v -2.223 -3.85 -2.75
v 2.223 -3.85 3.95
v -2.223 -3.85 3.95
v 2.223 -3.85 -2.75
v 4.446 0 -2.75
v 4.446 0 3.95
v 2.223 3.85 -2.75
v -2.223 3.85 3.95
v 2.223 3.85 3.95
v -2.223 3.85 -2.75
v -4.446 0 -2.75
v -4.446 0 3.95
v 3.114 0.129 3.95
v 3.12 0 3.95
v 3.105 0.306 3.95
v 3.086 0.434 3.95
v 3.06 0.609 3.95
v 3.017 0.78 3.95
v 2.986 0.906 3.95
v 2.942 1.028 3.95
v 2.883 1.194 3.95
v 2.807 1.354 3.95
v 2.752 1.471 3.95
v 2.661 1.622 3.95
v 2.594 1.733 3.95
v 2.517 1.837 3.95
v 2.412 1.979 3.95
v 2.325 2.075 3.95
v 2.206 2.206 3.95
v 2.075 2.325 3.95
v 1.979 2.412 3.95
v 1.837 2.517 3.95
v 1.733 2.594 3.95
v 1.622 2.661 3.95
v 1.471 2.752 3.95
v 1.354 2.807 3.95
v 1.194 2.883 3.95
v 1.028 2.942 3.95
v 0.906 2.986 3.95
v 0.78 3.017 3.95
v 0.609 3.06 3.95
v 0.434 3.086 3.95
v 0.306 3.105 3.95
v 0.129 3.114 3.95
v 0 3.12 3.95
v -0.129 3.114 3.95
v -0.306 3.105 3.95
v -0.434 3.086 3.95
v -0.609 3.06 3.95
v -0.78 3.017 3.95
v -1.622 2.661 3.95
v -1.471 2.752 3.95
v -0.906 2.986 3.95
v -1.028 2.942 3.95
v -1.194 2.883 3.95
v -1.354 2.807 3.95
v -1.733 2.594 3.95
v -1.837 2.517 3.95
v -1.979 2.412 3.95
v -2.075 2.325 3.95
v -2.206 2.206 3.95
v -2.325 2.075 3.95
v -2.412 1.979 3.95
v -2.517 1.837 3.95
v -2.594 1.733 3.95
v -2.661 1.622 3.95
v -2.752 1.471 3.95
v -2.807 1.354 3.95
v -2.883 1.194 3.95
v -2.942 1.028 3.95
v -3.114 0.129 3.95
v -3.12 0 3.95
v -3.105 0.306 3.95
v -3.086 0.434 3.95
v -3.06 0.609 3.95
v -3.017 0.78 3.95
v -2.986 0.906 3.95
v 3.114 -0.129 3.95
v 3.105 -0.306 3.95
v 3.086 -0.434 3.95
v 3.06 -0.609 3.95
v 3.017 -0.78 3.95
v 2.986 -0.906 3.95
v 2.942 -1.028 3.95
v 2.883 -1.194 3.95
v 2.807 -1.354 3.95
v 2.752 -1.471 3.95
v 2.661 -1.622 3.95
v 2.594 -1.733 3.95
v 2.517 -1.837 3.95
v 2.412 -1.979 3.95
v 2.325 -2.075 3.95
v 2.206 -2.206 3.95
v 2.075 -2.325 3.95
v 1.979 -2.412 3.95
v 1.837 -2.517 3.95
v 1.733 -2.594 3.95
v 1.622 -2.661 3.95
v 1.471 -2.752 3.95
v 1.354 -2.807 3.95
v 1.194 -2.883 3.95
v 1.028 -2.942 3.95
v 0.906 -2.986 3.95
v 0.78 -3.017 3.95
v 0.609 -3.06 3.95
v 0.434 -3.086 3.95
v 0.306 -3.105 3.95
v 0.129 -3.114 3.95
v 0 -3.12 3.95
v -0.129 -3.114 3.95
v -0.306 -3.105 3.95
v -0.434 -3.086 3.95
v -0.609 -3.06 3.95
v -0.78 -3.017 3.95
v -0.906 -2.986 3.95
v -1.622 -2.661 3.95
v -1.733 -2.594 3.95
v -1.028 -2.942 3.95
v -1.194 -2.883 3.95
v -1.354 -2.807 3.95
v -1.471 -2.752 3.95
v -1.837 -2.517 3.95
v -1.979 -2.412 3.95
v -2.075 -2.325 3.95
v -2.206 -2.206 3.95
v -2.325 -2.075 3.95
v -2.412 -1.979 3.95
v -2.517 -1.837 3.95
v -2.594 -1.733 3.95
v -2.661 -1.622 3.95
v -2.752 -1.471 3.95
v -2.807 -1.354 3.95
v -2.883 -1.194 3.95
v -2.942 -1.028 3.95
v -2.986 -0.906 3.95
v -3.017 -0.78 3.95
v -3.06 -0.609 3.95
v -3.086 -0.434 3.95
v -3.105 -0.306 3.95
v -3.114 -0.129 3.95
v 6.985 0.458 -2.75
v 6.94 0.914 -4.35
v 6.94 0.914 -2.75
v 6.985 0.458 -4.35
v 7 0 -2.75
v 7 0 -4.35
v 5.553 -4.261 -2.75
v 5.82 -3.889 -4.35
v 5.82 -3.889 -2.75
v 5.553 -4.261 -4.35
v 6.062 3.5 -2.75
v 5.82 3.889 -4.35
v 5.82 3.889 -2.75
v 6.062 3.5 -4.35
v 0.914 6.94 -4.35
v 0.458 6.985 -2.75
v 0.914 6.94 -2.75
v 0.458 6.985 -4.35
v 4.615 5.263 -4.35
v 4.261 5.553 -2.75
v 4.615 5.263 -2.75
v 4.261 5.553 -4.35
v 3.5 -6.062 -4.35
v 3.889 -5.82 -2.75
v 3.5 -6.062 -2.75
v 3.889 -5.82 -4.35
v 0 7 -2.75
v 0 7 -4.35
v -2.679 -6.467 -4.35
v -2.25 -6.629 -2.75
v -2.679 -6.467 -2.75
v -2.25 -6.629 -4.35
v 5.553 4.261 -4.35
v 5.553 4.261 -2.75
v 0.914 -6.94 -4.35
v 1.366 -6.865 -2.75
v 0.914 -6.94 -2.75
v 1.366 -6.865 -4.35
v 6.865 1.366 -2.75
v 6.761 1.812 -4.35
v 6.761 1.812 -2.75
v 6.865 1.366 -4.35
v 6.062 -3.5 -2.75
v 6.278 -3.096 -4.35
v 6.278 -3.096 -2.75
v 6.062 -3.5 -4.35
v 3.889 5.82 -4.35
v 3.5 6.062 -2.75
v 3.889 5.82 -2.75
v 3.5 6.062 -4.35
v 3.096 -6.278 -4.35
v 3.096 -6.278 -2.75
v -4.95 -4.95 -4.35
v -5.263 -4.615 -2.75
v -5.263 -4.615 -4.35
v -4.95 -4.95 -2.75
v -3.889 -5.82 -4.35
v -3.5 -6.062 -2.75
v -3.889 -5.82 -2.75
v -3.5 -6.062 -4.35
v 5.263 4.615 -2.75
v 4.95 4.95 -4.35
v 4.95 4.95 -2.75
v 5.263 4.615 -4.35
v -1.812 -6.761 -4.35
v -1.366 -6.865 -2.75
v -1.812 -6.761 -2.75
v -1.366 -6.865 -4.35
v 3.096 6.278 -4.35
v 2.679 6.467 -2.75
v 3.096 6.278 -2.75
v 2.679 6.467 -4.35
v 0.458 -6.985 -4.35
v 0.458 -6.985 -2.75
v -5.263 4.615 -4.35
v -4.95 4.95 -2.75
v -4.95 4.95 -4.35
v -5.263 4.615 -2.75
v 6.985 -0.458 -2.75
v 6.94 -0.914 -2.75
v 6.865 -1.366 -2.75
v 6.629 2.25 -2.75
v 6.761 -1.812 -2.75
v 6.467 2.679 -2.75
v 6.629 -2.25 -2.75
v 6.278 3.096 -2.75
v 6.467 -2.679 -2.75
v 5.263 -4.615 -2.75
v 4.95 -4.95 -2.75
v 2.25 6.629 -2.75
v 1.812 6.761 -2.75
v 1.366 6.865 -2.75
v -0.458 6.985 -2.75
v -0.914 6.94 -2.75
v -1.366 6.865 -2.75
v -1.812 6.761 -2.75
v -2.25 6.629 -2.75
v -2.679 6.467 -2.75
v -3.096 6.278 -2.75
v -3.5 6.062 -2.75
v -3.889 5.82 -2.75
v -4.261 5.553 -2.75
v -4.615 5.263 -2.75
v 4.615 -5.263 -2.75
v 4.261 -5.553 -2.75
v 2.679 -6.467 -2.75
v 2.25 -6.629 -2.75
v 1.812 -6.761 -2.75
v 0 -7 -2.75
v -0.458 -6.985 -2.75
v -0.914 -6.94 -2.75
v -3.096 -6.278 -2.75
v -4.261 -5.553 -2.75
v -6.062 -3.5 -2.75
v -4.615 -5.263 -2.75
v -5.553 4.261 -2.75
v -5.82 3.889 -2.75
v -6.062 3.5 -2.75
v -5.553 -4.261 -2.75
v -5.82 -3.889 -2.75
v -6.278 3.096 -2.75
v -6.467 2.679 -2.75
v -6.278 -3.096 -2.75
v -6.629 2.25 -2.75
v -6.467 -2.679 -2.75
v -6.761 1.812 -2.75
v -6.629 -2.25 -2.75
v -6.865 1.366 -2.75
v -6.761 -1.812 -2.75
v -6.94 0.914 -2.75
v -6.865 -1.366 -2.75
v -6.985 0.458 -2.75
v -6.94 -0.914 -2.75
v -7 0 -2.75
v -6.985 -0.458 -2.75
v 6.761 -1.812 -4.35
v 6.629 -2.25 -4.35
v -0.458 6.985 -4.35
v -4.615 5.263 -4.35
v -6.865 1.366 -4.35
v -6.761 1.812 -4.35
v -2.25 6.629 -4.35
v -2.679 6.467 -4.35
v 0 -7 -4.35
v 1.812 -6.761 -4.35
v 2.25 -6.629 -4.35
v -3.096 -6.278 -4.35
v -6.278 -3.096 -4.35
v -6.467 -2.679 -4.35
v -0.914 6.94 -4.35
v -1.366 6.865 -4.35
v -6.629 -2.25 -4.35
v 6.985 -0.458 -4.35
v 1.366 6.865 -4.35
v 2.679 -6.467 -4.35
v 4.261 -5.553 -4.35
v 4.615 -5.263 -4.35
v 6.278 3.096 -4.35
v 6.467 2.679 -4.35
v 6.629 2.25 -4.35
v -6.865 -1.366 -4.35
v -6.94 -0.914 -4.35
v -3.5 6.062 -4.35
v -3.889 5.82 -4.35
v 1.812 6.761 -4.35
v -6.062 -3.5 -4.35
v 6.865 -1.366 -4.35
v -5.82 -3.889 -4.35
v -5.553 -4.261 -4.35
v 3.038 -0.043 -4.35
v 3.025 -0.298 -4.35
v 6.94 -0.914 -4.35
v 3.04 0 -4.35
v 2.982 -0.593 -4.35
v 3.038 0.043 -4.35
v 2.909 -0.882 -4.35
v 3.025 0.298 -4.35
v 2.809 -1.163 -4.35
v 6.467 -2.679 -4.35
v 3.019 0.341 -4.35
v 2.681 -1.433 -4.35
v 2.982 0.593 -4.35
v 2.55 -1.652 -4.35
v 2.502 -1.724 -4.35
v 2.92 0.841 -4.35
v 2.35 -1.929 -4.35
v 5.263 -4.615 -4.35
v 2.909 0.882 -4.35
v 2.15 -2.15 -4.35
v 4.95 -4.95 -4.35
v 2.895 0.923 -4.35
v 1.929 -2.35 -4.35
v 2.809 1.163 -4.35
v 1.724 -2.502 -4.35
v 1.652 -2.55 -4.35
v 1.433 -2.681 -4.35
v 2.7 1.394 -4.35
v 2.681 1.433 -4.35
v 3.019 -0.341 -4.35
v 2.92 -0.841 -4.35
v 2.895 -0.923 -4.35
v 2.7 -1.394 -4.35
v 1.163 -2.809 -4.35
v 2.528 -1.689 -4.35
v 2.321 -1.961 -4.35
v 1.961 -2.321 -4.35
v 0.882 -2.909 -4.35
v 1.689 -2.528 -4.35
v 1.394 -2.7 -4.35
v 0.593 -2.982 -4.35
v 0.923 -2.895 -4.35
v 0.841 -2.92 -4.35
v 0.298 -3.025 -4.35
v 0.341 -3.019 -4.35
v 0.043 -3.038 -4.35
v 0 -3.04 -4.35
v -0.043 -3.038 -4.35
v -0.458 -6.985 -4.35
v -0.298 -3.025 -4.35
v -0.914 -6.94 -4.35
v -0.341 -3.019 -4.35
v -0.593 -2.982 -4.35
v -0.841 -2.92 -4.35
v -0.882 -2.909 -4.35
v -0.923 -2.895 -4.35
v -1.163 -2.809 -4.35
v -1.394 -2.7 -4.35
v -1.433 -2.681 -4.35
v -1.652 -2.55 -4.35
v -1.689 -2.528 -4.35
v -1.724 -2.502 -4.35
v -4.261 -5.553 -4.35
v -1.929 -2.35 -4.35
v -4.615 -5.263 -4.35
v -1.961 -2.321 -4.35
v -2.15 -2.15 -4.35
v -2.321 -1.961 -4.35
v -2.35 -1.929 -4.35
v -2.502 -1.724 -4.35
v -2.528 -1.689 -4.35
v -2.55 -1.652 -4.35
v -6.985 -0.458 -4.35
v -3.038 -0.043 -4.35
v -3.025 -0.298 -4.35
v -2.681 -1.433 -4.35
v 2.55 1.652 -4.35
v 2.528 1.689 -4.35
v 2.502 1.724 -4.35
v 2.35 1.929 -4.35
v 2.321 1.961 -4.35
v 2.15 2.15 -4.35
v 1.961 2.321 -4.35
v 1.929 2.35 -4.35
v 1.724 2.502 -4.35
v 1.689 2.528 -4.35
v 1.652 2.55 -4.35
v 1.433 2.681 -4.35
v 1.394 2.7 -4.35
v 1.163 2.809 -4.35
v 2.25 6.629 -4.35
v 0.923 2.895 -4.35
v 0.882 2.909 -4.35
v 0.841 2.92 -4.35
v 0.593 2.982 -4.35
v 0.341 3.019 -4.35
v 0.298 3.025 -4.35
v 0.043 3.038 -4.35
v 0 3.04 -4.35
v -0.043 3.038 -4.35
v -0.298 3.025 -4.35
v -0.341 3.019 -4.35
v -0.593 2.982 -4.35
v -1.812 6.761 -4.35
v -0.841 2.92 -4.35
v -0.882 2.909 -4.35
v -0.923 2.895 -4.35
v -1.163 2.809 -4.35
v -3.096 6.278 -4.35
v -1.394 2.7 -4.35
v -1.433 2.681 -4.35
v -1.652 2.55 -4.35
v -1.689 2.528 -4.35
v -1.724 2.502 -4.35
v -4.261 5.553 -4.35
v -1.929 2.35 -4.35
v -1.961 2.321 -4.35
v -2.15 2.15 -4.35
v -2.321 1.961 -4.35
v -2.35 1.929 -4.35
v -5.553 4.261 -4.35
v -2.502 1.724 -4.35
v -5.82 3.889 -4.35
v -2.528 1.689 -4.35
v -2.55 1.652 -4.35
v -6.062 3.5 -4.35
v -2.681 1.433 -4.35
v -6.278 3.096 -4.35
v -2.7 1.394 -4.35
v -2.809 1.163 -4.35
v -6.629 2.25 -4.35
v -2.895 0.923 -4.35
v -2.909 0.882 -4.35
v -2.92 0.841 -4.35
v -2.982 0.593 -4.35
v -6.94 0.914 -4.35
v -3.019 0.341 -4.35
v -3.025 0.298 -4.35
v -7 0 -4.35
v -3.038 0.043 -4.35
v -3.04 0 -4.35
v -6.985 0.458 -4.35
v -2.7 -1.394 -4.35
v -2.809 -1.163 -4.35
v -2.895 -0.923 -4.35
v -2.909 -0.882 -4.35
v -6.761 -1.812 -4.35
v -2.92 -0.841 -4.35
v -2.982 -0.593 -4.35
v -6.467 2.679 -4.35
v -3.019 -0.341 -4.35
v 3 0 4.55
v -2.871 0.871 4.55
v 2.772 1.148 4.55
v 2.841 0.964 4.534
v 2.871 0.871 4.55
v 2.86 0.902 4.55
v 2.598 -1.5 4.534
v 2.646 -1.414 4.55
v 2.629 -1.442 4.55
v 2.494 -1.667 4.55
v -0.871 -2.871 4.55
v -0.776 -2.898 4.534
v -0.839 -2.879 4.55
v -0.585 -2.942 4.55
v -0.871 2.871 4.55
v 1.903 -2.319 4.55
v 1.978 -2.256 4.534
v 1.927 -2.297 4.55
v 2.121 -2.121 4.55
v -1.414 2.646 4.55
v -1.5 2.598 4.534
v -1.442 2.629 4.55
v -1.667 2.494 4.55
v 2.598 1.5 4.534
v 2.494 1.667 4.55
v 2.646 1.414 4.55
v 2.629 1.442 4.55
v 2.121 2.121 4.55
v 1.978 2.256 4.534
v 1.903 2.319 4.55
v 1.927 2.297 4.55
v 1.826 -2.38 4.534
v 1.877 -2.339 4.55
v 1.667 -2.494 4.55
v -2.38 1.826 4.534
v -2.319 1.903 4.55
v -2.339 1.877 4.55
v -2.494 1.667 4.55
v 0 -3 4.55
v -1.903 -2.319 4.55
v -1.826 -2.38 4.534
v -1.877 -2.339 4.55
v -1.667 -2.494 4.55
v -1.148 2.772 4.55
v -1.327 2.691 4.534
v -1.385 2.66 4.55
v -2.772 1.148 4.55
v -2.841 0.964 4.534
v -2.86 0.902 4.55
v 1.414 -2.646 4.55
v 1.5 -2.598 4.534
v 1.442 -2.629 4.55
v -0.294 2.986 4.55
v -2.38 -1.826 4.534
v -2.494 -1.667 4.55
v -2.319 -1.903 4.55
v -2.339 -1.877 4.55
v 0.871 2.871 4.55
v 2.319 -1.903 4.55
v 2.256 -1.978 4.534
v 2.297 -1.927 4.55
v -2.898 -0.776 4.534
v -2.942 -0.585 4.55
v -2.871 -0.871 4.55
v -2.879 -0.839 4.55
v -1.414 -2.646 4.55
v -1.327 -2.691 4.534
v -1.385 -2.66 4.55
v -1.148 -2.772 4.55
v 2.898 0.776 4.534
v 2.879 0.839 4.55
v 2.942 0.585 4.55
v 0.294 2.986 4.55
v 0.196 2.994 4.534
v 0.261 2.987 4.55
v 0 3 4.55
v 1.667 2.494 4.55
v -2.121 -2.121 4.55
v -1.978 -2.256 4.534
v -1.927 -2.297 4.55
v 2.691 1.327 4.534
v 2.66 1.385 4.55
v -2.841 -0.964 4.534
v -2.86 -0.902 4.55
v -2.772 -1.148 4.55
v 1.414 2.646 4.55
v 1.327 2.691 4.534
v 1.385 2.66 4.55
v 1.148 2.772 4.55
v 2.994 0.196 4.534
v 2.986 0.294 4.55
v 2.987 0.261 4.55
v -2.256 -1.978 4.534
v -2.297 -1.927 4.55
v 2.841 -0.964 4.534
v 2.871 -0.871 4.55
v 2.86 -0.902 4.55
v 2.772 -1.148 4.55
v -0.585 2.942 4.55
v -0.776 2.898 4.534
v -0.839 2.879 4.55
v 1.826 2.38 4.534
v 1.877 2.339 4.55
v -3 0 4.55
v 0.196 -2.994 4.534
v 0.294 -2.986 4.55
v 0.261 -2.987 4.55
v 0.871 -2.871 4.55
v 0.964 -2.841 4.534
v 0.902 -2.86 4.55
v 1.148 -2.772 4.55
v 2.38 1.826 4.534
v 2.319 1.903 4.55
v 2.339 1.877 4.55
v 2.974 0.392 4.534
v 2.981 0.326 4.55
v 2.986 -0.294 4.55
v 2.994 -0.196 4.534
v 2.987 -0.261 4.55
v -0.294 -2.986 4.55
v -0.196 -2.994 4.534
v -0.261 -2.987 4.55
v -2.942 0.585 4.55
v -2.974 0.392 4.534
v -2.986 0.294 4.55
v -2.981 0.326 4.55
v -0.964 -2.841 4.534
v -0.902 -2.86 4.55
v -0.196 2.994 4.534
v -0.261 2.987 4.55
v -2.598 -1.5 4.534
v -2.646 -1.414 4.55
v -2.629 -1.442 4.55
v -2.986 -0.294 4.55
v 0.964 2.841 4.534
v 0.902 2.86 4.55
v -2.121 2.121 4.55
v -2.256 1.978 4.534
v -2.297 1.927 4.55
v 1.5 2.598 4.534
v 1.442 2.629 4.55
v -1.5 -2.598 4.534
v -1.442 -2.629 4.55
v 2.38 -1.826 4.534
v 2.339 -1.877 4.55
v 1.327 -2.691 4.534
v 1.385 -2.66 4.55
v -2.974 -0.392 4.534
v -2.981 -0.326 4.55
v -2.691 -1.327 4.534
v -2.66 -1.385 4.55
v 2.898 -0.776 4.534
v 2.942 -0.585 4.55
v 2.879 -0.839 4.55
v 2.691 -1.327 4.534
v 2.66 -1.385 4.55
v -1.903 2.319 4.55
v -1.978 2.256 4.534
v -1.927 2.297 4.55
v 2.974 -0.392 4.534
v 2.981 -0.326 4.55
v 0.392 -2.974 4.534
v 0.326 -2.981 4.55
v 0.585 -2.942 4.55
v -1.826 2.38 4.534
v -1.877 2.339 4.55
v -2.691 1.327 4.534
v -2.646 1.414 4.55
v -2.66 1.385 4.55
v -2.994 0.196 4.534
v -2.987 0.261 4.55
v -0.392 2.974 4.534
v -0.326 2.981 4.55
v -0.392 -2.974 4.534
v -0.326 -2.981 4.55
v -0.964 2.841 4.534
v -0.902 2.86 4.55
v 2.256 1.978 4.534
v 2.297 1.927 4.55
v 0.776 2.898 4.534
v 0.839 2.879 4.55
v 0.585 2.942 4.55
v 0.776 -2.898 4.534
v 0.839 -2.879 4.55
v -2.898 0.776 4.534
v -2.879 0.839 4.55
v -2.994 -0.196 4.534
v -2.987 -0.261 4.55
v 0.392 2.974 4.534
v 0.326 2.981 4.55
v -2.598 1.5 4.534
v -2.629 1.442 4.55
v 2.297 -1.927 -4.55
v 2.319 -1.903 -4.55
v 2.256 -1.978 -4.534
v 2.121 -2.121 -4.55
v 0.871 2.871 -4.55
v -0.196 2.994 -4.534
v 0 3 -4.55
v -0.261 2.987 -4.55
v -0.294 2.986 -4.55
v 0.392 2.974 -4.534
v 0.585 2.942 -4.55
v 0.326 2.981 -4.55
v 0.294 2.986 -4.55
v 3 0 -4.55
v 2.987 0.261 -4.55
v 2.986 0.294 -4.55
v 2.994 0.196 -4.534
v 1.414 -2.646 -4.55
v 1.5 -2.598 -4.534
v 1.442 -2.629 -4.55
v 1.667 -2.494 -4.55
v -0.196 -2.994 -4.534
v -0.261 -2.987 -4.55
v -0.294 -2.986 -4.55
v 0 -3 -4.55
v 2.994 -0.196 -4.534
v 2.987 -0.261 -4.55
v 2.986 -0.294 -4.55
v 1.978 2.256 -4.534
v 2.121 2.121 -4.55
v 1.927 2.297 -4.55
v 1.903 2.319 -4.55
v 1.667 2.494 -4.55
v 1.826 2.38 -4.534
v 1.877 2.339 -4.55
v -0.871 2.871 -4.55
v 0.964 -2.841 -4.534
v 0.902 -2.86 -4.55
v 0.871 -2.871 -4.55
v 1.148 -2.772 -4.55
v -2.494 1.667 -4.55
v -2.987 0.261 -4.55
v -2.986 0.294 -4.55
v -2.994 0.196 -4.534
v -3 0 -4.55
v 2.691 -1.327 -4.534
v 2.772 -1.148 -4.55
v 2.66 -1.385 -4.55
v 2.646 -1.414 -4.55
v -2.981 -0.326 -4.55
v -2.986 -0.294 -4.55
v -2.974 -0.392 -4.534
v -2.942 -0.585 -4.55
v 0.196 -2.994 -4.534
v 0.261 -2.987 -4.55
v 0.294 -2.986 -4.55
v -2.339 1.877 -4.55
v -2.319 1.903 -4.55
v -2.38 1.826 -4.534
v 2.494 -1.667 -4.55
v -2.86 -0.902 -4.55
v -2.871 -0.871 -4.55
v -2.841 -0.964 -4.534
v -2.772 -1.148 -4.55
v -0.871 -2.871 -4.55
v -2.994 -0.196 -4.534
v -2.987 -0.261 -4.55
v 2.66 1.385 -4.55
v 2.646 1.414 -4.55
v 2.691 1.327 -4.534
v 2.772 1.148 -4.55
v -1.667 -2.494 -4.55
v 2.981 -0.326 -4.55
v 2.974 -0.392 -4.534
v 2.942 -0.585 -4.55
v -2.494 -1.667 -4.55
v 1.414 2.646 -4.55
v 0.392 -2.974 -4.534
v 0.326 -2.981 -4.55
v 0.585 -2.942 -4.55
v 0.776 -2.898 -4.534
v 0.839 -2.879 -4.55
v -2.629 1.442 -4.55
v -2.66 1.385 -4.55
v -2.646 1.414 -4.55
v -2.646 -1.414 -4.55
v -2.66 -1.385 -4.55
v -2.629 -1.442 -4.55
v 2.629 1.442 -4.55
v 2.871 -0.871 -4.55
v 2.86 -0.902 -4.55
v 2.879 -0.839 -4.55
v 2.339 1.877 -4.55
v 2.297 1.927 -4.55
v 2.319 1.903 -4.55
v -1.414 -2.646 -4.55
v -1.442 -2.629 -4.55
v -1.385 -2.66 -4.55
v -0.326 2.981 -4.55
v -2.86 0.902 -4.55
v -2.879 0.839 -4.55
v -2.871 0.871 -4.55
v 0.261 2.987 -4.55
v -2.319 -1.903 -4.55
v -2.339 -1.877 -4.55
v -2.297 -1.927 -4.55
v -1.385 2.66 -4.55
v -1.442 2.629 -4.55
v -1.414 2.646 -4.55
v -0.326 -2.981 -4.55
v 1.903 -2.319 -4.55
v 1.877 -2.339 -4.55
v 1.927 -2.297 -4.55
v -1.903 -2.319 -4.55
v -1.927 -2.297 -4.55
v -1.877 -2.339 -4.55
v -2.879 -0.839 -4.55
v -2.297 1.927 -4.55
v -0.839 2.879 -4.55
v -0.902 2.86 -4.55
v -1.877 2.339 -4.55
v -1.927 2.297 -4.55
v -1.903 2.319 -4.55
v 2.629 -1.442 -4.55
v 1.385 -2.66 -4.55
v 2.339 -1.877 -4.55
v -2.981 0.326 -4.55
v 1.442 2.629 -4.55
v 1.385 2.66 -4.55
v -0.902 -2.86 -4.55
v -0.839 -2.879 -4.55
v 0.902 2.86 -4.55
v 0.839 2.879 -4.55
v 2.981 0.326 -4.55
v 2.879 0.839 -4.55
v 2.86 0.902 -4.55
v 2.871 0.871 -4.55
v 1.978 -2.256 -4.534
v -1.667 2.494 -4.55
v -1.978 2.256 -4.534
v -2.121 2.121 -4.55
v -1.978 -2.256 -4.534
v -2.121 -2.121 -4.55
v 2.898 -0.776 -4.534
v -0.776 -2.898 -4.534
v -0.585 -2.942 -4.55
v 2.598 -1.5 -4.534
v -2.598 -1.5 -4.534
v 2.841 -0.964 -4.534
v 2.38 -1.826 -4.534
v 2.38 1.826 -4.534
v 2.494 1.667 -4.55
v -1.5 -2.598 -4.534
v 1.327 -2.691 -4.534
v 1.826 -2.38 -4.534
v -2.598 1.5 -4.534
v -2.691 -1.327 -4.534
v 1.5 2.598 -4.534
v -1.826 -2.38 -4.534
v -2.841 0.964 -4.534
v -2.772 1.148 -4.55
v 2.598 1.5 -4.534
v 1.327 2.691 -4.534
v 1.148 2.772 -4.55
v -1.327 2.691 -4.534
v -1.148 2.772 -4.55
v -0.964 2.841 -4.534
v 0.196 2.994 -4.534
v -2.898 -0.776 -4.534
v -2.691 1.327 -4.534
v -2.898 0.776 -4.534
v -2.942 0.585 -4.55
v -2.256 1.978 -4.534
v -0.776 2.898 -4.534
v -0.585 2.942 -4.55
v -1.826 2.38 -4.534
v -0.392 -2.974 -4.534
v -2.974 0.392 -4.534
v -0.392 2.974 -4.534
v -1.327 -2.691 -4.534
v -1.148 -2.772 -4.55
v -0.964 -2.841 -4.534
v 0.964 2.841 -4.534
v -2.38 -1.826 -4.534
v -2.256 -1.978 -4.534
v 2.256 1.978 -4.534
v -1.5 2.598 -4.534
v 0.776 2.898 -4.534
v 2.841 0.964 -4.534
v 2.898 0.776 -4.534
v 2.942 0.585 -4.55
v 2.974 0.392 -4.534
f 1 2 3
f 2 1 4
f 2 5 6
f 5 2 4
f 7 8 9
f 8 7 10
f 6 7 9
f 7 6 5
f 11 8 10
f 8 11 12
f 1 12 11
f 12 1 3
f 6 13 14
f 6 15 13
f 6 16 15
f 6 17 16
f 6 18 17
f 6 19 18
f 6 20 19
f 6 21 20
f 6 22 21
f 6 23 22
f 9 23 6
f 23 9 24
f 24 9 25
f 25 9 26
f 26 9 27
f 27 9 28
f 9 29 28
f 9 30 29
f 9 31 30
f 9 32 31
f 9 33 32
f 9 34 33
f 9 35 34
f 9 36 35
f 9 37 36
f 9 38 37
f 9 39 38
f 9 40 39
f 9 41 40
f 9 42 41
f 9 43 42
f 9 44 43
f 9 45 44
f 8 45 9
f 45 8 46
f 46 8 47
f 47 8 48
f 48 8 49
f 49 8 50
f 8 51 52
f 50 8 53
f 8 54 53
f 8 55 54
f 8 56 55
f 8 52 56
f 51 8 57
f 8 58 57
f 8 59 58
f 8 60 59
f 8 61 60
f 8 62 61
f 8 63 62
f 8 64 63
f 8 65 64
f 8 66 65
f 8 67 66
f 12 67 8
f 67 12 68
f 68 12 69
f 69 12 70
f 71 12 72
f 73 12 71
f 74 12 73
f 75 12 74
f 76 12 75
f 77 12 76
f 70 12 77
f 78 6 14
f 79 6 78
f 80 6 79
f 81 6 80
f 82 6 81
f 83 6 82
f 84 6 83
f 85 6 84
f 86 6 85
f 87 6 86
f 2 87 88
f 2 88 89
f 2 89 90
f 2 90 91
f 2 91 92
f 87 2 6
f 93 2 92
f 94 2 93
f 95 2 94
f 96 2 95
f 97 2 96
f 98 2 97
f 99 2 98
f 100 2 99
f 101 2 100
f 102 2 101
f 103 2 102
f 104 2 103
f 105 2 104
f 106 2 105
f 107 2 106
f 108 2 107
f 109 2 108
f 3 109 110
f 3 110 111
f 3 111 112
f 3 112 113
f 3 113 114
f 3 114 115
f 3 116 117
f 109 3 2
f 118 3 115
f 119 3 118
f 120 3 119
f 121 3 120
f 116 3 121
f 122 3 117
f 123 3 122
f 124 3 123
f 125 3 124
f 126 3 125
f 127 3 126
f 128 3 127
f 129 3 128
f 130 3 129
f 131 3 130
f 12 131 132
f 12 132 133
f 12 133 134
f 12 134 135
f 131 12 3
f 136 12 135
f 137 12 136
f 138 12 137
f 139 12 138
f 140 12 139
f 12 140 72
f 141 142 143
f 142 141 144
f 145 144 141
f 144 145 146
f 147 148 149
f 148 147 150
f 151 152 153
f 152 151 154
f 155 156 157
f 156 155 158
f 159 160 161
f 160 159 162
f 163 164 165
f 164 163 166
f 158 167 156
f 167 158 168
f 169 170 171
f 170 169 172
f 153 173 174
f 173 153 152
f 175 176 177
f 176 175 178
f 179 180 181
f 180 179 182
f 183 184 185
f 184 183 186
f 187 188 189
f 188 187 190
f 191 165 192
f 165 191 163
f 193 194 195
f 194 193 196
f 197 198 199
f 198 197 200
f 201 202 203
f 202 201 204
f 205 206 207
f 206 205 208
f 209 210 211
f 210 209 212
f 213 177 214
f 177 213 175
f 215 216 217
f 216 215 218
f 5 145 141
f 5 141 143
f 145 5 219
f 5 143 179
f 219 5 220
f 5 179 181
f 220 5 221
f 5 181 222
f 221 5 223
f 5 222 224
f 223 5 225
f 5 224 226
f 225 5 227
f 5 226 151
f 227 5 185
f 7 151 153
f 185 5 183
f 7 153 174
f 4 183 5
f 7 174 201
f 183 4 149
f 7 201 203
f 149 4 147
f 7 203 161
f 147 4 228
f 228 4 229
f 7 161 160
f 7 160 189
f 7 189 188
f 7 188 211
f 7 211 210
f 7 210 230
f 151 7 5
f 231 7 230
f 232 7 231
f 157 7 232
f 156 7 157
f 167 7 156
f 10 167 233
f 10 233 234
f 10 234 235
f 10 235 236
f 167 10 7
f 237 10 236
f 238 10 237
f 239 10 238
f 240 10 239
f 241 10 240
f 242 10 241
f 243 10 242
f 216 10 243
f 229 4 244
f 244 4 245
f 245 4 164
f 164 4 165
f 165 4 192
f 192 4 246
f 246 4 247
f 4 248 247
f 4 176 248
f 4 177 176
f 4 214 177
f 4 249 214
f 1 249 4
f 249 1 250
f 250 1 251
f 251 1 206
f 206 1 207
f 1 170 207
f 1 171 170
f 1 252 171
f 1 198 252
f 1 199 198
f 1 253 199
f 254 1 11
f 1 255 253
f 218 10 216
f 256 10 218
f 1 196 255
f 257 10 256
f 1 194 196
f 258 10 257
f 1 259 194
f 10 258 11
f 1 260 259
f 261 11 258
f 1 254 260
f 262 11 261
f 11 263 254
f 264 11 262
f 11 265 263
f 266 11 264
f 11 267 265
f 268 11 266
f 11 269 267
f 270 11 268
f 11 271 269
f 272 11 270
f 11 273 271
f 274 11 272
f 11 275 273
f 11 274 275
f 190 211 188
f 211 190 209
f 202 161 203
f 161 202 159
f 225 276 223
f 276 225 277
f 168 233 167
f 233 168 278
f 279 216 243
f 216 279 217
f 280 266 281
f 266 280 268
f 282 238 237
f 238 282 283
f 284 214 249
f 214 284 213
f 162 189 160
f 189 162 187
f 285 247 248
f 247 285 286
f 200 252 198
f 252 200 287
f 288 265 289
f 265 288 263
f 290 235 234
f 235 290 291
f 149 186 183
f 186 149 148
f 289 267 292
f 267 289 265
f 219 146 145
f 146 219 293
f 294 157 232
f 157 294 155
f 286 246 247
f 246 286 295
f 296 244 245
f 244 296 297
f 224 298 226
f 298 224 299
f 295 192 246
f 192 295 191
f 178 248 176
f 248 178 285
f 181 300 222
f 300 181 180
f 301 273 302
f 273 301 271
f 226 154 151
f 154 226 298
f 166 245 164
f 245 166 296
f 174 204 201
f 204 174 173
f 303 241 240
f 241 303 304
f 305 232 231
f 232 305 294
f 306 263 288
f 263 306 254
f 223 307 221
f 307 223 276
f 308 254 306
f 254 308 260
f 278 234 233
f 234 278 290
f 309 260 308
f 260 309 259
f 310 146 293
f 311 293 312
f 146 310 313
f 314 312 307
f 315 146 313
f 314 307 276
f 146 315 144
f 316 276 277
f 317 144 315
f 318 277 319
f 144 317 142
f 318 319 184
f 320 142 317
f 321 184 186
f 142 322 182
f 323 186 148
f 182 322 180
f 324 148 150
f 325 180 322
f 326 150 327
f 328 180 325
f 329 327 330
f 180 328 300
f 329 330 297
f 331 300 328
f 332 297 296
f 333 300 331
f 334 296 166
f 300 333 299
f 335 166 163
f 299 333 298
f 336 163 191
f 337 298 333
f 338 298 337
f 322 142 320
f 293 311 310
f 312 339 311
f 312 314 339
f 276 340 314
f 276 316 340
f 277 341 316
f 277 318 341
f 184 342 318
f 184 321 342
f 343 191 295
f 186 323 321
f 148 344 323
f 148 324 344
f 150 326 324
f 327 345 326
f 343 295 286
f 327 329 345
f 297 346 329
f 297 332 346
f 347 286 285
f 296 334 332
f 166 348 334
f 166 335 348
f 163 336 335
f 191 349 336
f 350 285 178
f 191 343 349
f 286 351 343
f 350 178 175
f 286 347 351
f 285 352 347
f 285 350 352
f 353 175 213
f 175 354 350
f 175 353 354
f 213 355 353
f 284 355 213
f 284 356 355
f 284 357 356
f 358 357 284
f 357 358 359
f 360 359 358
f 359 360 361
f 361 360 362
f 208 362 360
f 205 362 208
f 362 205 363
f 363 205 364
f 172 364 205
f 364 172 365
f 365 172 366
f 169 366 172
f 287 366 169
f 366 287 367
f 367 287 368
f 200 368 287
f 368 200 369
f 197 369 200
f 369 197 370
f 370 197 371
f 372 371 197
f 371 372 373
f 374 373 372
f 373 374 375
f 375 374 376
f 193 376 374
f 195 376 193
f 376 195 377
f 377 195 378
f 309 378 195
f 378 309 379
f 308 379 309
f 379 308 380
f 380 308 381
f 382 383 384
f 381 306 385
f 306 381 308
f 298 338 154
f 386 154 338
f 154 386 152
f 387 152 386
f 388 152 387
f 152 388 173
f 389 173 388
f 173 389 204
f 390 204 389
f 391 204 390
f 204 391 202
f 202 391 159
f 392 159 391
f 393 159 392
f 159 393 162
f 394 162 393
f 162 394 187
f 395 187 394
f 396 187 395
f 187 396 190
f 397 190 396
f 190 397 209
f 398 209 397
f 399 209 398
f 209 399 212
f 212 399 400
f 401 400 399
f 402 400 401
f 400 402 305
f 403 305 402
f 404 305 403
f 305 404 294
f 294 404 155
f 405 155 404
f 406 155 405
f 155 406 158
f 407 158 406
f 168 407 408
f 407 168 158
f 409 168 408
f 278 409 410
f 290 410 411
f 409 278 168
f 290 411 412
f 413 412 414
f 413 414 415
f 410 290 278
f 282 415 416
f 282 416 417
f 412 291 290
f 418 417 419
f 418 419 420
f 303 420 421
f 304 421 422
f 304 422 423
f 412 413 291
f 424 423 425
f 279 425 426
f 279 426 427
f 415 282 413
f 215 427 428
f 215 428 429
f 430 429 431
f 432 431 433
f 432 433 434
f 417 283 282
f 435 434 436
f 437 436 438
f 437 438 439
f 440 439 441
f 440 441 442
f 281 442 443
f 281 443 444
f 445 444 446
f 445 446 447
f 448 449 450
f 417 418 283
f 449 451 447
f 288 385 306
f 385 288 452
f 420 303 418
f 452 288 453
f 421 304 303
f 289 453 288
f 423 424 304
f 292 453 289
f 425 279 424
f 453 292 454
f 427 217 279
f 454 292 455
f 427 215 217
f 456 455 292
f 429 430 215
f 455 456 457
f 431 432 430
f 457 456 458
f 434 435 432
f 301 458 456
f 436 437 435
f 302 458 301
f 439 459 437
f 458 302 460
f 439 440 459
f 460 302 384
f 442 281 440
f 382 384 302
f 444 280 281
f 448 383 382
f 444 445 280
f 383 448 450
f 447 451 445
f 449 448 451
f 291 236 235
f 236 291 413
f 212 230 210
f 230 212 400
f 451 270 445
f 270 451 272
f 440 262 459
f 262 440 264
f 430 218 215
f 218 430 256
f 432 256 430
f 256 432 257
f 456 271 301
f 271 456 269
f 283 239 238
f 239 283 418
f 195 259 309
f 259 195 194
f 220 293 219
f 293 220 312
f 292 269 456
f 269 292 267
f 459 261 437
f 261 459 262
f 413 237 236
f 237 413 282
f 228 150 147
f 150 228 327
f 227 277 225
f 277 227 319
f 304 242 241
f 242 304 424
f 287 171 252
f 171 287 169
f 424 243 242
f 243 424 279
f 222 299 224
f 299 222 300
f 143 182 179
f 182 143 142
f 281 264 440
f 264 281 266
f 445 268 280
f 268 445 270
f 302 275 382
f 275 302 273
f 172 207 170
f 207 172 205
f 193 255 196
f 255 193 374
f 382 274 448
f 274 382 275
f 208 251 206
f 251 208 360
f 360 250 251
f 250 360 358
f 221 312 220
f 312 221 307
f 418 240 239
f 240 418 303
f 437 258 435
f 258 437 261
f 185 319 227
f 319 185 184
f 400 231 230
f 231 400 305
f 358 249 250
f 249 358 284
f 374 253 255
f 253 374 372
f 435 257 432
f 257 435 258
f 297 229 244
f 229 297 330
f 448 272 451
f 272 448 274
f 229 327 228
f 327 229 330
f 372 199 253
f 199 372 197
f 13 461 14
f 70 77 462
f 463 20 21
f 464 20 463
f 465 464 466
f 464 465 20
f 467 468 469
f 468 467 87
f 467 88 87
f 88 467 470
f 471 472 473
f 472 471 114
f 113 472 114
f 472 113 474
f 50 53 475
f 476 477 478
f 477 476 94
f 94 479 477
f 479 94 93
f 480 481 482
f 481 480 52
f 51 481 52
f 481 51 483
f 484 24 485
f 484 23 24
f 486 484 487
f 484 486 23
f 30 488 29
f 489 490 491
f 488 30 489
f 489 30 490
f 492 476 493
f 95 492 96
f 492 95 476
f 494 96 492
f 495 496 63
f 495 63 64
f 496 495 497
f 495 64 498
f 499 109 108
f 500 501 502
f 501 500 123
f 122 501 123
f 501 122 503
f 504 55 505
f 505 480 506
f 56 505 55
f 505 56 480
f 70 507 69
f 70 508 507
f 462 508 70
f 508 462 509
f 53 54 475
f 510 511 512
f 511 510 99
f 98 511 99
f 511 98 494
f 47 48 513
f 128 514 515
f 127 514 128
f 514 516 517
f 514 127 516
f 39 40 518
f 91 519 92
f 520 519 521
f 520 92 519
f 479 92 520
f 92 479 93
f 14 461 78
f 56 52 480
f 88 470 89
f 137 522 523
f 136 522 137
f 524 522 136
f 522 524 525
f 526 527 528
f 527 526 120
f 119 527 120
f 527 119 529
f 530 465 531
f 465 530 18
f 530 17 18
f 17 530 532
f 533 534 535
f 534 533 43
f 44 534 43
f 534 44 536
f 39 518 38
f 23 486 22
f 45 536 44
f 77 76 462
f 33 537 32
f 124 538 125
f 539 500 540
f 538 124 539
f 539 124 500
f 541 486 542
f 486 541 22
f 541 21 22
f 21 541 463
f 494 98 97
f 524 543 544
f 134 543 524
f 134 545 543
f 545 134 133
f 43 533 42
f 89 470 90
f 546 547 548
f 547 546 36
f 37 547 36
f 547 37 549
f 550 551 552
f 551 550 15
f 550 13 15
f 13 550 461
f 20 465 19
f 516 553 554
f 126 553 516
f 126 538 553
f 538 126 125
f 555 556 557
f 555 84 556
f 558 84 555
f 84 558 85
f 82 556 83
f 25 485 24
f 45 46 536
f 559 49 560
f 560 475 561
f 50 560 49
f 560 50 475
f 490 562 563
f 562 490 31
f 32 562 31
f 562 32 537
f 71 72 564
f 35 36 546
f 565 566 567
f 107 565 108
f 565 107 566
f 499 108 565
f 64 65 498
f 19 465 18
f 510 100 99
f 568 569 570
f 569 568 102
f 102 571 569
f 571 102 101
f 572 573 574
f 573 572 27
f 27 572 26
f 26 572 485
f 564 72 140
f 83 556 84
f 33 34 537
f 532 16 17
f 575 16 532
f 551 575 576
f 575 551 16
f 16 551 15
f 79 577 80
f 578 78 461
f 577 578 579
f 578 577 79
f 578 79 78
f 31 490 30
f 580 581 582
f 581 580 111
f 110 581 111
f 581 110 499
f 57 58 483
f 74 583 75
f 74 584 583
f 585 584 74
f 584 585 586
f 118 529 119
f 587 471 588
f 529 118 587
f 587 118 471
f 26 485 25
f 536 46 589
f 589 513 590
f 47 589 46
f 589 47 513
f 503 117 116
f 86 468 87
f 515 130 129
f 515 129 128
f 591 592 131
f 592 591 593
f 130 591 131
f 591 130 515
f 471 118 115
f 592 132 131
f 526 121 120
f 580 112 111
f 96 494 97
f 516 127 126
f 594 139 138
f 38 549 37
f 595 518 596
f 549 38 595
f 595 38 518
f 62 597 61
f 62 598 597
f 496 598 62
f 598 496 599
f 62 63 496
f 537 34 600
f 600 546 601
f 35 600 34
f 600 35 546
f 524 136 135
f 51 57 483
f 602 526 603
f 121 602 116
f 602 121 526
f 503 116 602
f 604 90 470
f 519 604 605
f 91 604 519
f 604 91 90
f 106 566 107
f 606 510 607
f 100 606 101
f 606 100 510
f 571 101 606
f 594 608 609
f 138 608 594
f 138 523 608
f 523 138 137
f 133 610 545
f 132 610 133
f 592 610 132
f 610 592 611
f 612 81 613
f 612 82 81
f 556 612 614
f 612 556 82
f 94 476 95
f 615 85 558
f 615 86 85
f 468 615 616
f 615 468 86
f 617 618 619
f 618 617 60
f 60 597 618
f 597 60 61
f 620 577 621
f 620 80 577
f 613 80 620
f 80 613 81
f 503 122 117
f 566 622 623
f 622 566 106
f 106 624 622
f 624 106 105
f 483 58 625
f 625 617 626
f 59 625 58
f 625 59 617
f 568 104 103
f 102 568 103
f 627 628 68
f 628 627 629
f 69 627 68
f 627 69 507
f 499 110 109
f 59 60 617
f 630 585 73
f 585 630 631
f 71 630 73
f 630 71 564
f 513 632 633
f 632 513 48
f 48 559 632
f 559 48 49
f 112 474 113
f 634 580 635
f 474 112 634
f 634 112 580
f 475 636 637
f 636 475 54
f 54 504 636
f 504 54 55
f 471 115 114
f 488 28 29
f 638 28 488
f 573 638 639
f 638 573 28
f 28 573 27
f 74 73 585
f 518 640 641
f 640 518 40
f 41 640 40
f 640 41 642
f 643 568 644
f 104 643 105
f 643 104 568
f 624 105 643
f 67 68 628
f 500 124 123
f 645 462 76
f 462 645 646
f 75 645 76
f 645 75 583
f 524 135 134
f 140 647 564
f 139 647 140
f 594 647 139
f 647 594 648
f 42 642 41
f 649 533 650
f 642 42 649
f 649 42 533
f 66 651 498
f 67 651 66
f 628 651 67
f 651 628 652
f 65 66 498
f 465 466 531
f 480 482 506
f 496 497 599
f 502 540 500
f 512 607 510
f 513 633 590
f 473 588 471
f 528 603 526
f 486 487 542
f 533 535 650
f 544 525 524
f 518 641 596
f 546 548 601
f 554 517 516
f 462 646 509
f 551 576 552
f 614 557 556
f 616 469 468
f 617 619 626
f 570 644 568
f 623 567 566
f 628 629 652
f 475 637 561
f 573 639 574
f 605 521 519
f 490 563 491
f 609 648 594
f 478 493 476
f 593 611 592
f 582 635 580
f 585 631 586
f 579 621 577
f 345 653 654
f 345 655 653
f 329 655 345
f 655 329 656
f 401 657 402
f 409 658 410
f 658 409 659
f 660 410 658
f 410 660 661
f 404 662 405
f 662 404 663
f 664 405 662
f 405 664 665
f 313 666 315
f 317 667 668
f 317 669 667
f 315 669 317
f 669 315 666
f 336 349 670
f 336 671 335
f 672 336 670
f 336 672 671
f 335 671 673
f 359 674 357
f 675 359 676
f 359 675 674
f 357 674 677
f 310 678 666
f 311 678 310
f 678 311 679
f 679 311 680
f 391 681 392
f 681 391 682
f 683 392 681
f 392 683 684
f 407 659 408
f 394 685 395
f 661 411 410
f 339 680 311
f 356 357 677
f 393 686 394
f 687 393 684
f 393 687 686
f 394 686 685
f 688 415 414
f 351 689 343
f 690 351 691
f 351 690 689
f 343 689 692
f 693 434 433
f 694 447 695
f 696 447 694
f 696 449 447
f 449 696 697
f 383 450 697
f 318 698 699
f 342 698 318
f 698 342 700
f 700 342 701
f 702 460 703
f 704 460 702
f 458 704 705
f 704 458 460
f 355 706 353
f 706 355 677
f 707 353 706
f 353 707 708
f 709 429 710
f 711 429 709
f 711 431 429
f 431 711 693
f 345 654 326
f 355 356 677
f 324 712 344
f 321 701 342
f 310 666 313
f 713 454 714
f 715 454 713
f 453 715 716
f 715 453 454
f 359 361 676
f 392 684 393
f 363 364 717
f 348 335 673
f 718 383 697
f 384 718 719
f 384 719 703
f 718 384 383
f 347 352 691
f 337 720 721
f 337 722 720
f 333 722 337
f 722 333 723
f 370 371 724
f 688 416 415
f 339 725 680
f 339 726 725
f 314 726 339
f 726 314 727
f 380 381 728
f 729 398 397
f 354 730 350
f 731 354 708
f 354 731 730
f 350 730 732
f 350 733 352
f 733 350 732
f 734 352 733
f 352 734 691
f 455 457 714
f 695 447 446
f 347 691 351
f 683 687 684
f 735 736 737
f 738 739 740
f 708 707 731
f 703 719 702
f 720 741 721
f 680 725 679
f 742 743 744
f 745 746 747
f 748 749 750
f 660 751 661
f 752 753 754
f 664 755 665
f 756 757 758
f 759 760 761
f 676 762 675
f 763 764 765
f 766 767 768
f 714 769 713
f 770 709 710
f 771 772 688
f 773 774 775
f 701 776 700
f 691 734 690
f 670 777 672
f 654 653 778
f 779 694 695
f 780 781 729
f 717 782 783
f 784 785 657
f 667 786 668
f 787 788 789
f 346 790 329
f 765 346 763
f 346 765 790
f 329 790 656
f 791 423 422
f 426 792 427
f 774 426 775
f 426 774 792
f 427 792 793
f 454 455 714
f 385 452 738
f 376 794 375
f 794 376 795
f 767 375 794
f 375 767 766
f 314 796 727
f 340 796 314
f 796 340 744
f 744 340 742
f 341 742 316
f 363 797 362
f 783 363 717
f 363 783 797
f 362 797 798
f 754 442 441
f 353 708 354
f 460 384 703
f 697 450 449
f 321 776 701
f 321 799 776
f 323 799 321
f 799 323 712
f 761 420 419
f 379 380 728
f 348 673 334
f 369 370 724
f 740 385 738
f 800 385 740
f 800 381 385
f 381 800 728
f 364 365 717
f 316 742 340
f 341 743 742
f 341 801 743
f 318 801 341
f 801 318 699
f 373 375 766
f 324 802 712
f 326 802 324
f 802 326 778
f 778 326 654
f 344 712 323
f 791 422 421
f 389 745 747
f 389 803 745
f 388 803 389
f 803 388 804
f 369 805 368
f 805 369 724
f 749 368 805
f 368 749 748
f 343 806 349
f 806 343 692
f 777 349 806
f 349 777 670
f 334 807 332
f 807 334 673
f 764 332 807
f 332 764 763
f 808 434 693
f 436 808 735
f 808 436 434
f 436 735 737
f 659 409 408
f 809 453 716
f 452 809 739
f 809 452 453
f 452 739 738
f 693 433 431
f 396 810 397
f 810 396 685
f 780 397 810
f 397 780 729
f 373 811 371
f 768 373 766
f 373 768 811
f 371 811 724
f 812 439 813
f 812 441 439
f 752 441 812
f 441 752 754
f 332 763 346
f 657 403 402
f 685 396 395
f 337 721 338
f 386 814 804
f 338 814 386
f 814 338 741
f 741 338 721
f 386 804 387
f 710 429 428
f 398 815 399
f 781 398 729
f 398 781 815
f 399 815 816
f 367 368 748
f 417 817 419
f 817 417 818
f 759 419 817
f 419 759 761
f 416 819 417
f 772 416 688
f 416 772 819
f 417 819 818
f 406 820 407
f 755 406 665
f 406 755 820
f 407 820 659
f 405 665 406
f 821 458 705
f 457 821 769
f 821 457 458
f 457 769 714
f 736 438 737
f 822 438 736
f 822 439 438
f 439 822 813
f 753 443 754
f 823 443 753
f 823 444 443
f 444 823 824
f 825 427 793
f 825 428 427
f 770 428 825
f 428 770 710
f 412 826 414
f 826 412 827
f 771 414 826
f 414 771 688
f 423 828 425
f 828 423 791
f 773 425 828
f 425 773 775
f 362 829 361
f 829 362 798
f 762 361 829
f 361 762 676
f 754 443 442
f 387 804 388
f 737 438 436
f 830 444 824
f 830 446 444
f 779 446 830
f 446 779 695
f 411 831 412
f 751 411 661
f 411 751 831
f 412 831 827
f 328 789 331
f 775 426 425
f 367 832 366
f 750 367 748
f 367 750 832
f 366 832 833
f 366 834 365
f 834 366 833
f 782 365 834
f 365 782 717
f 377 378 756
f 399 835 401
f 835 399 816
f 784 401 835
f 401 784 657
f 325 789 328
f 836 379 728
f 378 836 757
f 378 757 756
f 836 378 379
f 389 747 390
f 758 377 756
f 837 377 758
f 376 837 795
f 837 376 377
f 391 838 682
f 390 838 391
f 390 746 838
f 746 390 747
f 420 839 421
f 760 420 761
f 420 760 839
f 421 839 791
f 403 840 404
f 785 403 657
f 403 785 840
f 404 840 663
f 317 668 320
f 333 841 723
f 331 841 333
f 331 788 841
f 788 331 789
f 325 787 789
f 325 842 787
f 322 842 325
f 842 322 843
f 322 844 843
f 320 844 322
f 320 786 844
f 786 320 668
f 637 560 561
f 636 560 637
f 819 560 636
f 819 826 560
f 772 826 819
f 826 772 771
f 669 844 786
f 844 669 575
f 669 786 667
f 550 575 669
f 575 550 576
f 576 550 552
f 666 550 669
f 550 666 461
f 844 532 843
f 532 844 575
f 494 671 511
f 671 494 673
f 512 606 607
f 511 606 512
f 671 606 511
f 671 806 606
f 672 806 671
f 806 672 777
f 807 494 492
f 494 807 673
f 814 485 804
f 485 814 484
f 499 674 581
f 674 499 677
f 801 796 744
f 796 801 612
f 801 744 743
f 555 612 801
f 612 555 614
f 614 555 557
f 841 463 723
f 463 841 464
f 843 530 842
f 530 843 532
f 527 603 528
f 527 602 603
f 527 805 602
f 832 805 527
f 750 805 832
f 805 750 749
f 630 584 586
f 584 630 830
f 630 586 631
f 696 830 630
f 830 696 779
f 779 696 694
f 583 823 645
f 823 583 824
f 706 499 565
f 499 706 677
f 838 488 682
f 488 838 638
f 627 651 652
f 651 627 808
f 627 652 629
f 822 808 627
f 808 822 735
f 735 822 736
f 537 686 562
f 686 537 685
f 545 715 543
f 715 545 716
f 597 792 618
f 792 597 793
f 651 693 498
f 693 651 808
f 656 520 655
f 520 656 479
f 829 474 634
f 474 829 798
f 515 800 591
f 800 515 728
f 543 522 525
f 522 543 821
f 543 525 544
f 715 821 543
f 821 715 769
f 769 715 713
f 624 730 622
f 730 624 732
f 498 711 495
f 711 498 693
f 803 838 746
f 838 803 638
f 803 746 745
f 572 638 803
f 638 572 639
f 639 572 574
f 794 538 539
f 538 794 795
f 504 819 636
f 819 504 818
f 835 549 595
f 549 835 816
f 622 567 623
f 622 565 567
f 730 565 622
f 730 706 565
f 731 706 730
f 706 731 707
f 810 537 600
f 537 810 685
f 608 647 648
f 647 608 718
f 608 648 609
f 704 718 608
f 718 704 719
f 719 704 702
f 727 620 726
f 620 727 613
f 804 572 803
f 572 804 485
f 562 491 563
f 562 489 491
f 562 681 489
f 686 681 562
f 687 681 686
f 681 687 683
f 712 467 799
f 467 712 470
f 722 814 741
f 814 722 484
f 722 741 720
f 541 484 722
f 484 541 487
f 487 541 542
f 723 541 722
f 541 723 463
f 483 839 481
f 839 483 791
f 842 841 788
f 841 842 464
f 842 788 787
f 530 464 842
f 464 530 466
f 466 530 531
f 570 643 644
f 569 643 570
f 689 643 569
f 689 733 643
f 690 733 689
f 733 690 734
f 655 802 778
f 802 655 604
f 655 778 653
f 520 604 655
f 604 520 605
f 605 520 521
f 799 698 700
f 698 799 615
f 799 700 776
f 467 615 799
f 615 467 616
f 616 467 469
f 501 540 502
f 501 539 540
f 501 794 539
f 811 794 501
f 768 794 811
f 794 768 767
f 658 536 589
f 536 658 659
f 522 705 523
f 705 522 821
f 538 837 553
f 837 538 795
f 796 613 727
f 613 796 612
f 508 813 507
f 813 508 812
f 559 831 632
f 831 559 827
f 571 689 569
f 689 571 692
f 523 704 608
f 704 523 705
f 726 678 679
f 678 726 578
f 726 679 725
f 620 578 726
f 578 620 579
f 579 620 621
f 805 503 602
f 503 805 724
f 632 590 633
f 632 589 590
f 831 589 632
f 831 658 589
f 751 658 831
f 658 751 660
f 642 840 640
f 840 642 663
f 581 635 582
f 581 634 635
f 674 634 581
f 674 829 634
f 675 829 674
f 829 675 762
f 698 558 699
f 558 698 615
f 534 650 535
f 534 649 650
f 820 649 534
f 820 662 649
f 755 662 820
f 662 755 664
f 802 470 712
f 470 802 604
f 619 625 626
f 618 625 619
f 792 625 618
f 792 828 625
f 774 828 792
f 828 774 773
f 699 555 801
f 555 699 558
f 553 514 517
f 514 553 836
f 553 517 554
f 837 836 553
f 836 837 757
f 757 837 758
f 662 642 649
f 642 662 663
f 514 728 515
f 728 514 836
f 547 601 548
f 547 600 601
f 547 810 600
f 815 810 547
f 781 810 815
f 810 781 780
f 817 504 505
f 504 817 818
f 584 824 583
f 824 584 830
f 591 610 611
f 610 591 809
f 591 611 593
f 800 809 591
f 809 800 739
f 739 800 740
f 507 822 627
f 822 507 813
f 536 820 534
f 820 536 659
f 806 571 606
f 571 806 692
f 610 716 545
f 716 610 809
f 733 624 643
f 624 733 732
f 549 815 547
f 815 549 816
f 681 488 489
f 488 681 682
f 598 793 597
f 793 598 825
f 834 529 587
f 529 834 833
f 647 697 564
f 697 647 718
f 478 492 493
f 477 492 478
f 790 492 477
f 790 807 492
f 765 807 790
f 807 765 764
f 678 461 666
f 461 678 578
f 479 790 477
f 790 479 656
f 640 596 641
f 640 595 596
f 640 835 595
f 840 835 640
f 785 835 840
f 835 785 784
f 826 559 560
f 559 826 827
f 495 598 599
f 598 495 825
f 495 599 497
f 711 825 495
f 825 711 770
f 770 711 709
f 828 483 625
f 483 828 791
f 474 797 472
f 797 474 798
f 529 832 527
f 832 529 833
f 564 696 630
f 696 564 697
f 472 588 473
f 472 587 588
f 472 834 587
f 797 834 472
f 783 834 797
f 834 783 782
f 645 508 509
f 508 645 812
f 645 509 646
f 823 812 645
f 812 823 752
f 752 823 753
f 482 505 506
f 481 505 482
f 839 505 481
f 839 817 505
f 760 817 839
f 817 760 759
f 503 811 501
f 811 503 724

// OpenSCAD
// Parameters
thread_diameter_mm = 6.0; //[3.0:12.0:0.1]
across_flats_mm = 7.7; //[4.0:16.0:0.1]
thickness_mm = 7.9; //[4.0:16.0:0.1]
hole_diameter_mm = 6.0; //[3.0:12.0:0.1]
chamfer_mm = 0.3; //[0.0:1.5:0.05]
overlap_mm = 1.2; //[0.2:2.0:0.1]  // ensure 1–2mm overlap for robust attachment
washer_outer_diameter_mm = 14.0; //[8.0:28.0:0.1]
washer_thickness_mm = 1.6; //[0.8:4.0:0.1]

// Hex Nut + Washer as ONE connected solid (no floating parts)
module nut_and_washer() {

  // Derived radii
  nut_r   = across_flats_mm/(2*cos(30));   // circumscribed radius for $fn=6
  hole_r  = hole_diameter_mm/2;
  washer_r = washer_outer_diameter_mm/2;

  // Nut spans (centered): z = [-thickness/2, +thickness/2]
  // Washer should be BELOW the nut and overlap into it by overlap_mm.
  // Place washer so its TOP face is at z = (-thickness/2 + overlap_mm)
  // => washer_center_z = (-thickness/2 + overlap_mm) - washer_thickness/2
  washer_center_z = (-thickness_mm/2 + overlap_mm) - (washer_thickness_mm/2);

  difference() {
    union() {
      // Nut body (hex)
      cylinder(r=nut_r, h=thickness_mm, center=true, $fn=6);

      // Washer disc (solid disc; hole is cut later by the global through-hole)
      // This guarantees the washer is physically attached to the nut via overlap.
      translate([0, 0, washer_center_z])
        cylinder(r=washer_r, h=washer_thickness_mm, center=true, $fn=96);

      // Chamfer material around hole edges (will be cut by through-hole)
      // Keep them within the nut thickness; add a tiny overlap to avoid coplanar faces.
      translate([0, 0,  thickness_mm/2 - chamfer_mm/2])
        cylinder(r1=hole_r + chamfer_mm, r2=hole_r, h=chamfer_mm + overlap_mm, center=true, $fn=64);

      translate([0, 0, -thickness_mm/2 + chamfer_mm/2])
        cylinder(r1=hole_r, r2=hole_r + chamfer_mm, h=chamfer_mm + overlap_mm, center=true, $fn=64);
    }

    // Central through hole (cuts nut + washer together; no internal floating pieces)
    // Make it long enough to fully pass through both parts regardless of overlap.
    cylinder(r=hole_r, h=thickness_mm + washer_thickness_mm + 6*overlap_mm, center=true, $fn=96);
  }
}

// Assembly
module assembly() {
  nut_and_washer();
}

assembly();
